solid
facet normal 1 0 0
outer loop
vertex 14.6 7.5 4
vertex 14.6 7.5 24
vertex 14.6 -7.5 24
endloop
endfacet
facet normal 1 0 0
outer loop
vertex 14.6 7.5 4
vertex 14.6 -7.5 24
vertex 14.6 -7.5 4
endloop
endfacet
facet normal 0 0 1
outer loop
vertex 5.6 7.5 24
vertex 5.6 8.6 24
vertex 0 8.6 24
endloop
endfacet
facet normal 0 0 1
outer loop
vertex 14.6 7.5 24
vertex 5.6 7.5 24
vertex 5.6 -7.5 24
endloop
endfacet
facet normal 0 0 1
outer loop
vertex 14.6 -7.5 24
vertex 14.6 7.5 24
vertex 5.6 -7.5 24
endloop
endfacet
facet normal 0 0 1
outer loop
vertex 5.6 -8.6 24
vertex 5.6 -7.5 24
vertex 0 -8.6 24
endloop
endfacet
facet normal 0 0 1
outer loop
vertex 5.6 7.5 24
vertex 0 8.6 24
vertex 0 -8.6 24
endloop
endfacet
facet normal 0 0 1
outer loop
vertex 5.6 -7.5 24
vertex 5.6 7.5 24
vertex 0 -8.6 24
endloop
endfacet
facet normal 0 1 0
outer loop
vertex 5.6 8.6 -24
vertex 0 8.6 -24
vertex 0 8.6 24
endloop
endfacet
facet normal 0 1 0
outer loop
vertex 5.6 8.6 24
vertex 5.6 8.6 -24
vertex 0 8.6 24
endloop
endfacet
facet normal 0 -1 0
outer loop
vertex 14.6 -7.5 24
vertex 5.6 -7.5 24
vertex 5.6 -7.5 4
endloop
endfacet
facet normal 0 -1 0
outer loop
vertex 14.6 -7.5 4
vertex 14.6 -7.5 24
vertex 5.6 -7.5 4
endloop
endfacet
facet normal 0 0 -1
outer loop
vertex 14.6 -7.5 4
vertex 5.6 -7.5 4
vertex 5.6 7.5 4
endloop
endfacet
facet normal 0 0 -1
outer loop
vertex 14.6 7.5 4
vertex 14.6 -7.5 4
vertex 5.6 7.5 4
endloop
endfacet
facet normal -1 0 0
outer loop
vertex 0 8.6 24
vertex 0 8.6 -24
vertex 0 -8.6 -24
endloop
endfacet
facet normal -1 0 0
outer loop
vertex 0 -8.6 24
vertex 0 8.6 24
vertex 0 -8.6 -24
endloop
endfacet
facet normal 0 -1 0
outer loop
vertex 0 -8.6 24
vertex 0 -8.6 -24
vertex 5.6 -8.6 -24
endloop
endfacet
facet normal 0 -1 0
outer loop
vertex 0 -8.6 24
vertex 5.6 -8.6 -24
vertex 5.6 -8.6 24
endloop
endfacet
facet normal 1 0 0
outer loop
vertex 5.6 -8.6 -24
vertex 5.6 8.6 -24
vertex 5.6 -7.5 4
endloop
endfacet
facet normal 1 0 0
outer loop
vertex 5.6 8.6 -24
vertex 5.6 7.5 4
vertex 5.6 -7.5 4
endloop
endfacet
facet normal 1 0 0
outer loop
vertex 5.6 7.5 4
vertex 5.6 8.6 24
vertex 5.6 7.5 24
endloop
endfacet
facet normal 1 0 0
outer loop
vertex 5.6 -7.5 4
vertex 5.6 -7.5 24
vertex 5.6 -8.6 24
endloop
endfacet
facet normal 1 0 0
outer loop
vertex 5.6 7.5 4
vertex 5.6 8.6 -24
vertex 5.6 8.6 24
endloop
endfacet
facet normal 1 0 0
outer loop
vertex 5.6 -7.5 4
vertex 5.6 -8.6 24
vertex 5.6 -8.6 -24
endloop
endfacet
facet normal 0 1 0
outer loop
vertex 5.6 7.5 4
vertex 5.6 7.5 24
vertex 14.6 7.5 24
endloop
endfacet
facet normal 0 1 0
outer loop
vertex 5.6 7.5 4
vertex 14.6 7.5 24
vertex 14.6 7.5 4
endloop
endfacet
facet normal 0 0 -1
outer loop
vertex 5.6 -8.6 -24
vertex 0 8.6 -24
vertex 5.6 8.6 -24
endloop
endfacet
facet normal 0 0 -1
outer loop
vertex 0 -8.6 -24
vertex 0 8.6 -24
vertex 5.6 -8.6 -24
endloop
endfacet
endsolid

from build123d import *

# Parameters (mm, degrees)
SKETCH_1_W      = 17.2
SKETCH_1_H      = 48
EXTRUDE_1_DEPTH = 5.6
SKETCH_2_W      = 20
SKETCH_2_H      = 15
EXTRUDE_2_DEPTH = 9


with BuildPart() as part:
    # 草图1 → 凸台-拉伸1 (new body)
    with BuildSketch(Plane(origin=(0, 0, 0), x_dir=(0, -1, 0), z_dir=(-1, 0, 0))):
        Rectangle(SKETCH_1_W, SKETCH_1_H)
    extrude(amount=-EXTRUDE_1_DEPTH)

    # 草图2 → 凸台-拉伸2 (add)
    with BuildSketch(Plane(origin=(5.6, 0, 0), x_dir=(0, 0, -1), z_dir=(1, 0, 0))):
        with Locations((-14, 0)):
            Rectangle(SKETCH_2_W, SKETCH_2_H)
    extrude(amount=EXTRUDE_2_DEPTH)


solid = part.part
